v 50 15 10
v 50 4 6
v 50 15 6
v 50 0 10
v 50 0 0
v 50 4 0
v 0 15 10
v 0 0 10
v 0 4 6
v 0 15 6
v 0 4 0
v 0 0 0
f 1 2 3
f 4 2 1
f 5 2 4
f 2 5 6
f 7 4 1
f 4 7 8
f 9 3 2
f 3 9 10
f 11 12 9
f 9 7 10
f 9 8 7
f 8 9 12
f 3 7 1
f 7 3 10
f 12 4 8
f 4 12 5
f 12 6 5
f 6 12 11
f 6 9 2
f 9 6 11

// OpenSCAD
//Seifenhalter
$fn=36;
//links rechts
lr=15;
//länge
l=50;
//höhe
h=10;
//thickness
t=4;

translate([0,0,h-t])
cube([l, lr, t]);

color("blue")
cube([l, t, h]);
